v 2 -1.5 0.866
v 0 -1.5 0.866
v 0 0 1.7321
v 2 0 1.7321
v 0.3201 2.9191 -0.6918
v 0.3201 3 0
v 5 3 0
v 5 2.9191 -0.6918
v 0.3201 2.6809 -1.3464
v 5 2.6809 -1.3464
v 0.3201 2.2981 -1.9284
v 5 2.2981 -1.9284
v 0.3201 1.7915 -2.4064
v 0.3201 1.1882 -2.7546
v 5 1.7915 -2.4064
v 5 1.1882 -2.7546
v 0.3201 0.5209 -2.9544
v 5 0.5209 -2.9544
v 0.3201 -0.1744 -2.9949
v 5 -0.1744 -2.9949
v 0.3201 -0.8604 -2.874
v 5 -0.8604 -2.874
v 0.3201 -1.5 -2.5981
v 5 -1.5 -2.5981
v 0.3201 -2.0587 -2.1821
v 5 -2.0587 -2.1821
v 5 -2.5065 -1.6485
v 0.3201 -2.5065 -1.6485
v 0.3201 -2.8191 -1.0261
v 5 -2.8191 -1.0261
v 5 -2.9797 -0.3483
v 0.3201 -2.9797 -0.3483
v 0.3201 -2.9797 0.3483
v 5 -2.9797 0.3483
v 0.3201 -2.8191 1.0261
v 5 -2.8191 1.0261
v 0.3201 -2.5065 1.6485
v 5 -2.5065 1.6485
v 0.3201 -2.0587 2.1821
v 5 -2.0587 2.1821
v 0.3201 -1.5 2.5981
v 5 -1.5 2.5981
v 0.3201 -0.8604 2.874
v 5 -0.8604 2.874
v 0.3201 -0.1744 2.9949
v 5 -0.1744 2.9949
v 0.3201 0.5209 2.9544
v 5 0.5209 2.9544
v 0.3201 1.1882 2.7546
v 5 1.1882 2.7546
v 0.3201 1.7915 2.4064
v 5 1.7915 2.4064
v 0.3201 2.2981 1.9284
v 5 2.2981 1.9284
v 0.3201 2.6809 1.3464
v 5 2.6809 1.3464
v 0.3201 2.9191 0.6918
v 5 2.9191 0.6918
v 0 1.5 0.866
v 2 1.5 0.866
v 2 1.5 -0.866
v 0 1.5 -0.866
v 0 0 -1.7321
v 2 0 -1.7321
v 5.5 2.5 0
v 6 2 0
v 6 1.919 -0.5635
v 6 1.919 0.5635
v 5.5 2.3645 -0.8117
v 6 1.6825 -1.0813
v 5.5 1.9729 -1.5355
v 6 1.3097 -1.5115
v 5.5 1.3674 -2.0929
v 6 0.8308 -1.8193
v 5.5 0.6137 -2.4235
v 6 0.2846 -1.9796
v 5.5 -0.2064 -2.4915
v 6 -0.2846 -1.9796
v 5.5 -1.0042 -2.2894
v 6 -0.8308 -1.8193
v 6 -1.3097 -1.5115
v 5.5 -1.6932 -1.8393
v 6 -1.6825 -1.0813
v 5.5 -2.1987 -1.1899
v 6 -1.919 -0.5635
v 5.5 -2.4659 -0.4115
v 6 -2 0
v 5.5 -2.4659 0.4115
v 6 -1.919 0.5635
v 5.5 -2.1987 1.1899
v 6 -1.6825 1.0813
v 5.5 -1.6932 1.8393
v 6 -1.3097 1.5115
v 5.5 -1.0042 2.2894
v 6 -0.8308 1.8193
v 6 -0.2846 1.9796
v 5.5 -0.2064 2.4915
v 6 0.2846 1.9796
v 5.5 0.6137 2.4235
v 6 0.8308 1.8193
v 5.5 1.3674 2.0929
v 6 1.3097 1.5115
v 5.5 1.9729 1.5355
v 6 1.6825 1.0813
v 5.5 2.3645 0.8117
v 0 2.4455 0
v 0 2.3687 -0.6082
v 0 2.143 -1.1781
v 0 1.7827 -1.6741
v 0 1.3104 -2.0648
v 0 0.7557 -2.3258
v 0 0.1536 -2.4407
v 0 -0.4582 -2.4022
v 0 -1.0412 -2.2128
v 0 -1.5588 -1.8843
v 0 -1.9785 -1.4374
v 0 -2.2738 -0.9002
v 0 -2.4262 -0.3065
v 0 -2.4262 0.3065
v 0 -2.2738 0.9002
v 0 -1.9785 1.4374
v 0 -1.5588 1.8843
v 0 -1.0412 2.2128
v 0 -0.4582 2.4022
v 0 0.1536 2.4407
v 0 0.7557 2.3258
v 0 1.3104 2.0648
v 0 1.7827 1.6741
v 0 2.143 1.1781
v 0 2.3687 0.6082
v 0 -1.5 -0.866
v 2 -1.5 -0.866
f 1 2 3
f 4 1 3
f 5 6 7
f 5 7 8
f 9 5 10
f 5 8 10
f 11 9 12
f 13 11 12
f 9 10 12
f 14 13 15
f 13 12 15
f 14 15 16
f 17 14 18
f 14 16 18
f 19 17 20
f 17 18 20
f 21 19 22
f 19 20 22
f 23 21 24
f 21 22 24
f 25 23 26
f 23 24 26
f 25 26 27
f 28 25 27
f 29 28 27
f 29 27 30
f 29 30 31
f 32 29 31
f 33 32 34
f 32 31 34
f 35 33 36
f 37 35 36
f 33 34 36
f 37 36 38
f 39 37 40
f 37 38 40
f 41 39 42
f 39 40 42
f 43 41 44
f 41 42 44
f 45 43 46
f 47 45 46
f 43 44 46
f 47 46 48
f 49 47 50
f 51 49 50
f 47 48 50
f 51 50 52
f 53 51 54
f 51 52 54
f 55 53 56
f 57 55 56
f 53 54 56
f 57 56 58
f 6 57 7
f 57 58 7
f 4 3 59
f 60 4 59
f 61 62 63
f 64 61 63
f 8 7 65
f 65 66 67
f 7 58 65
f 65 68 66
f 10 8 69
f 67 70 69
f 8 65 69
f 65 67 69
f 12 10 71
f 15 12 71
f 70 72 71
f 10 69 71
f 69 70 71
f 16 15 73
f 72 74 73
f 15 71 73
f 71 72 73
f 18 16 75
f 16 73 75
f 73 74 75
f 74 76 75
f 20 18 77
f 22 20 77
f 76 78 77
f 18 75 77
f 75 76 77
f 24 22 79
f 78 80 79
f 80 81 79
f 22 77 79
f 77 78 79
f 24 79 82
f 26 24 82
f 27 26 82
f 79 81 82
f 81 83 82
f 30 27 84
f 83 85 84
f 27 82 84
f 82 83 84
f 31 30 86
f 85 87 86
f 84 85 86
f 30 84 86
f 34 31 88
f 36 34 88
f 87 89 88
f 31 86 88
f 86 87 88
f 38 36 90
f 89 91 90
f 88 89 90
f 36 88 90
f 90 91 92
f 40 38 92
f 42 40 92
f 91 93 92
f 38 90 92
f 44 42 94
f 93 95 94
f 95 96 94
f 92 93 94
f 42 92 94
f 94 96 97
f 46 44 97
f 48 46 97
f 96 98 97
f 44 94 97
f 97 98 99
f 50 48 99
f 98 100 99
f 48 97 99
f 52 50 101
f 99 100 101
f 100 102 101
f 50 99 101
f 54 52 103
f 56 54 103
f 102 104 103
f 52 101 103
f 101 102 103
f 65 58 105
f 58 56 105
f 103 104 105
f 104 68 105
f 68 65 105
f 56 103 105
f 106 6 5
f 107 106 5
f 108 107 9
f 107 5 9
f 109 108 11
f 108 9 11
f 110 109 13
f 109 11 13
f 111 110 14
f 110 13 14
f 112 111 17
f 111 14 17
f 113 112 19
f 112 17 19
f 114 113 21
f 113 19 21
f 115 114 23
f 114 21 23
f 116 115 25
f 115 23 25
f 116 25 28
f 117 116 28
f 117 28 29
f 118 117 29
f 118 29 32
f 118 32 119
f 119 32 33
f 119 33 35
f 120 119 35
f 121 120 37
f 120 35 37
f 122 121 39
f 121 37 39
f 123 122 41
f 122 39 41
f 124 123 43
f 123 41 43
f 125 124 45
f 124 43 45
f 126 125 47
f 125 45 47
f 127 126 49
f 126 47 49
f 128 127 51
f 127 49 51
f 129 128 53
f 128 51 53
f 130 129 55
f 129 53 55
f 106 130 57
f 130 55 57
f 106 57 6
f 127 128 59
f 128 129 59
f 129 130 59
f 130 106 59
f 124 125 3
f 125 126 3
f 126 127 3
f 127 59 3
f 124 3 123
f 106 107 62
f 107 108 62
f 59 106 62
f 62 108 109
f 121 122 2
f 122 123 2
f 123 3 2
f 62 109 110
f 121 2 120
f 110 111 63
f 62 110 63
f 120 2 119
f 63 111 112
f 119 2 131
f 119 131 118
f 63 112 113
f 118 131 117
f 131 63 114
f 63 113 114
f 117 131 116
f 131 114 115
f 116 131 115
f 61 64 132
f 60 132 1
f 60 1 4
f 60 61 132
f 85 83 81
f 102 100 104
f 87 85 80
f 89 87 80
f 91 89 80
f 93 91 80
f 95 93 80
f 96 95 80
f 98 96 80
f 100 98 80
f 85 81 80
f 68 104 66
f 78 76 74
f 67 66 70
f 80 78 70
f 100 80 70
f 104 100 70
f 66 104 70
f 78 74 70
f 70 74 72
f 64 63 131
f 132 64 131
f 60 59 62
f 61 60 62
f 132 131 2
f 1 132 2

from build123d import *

# Parameters (mm, degrees)
CUT_EXTRUDE_1_DEPTH = 2
CHAMFER_1_SIZE      = 0.5545
CHAMFER_1_SIZE2     = 0.320140724


with BuildPart() as part:
    # Эскиз1 → Повернуть1 (revolve)
    with BuildSketch(Plane(origin=(0, 0, 0), x_dir=(-1, 0, 0), z_dir=(0, 0, -1))):
        Polygon((-6, 2), (-6, 0), (0, 0), (0, 3), (-5, 3), align=None)
    revolve(axis=Axis((6, 0, 0), (-1, 0, 0)))

    # Эскиз2 → Вырез-Вытянуть1 (cut)
    with BuildSketch(Plane.ZY):
        Polygon((1.732050808, 0), (0.866025404, 1.5), (-0.866025404, 1.5), (-1.732050808, 0), (-0.866025404, -1.5), (0.866025404, -1.5), align=None)
    extrude(amount=-CUT_EXTRUDE_1_DEPTH, mode=Mode.SUBTRACT)

    # Фаска1
    chamfer_1_edges = [part.edges().sort_by_distance(p)[0] for p in [
        (0, -3, 0),
    ]]
    chamfer_1_side = [part.faces().sort_by_distance(p)[0] for p in [
        (0, -2.915147186, 0),
    ]]
    chamfer(chamfer_1_edges, length=CHAMFER_1_SIZE, length2=CHAMFER_1_SIZE2, reference=chamfer_1_side[0])


solid = part.part
